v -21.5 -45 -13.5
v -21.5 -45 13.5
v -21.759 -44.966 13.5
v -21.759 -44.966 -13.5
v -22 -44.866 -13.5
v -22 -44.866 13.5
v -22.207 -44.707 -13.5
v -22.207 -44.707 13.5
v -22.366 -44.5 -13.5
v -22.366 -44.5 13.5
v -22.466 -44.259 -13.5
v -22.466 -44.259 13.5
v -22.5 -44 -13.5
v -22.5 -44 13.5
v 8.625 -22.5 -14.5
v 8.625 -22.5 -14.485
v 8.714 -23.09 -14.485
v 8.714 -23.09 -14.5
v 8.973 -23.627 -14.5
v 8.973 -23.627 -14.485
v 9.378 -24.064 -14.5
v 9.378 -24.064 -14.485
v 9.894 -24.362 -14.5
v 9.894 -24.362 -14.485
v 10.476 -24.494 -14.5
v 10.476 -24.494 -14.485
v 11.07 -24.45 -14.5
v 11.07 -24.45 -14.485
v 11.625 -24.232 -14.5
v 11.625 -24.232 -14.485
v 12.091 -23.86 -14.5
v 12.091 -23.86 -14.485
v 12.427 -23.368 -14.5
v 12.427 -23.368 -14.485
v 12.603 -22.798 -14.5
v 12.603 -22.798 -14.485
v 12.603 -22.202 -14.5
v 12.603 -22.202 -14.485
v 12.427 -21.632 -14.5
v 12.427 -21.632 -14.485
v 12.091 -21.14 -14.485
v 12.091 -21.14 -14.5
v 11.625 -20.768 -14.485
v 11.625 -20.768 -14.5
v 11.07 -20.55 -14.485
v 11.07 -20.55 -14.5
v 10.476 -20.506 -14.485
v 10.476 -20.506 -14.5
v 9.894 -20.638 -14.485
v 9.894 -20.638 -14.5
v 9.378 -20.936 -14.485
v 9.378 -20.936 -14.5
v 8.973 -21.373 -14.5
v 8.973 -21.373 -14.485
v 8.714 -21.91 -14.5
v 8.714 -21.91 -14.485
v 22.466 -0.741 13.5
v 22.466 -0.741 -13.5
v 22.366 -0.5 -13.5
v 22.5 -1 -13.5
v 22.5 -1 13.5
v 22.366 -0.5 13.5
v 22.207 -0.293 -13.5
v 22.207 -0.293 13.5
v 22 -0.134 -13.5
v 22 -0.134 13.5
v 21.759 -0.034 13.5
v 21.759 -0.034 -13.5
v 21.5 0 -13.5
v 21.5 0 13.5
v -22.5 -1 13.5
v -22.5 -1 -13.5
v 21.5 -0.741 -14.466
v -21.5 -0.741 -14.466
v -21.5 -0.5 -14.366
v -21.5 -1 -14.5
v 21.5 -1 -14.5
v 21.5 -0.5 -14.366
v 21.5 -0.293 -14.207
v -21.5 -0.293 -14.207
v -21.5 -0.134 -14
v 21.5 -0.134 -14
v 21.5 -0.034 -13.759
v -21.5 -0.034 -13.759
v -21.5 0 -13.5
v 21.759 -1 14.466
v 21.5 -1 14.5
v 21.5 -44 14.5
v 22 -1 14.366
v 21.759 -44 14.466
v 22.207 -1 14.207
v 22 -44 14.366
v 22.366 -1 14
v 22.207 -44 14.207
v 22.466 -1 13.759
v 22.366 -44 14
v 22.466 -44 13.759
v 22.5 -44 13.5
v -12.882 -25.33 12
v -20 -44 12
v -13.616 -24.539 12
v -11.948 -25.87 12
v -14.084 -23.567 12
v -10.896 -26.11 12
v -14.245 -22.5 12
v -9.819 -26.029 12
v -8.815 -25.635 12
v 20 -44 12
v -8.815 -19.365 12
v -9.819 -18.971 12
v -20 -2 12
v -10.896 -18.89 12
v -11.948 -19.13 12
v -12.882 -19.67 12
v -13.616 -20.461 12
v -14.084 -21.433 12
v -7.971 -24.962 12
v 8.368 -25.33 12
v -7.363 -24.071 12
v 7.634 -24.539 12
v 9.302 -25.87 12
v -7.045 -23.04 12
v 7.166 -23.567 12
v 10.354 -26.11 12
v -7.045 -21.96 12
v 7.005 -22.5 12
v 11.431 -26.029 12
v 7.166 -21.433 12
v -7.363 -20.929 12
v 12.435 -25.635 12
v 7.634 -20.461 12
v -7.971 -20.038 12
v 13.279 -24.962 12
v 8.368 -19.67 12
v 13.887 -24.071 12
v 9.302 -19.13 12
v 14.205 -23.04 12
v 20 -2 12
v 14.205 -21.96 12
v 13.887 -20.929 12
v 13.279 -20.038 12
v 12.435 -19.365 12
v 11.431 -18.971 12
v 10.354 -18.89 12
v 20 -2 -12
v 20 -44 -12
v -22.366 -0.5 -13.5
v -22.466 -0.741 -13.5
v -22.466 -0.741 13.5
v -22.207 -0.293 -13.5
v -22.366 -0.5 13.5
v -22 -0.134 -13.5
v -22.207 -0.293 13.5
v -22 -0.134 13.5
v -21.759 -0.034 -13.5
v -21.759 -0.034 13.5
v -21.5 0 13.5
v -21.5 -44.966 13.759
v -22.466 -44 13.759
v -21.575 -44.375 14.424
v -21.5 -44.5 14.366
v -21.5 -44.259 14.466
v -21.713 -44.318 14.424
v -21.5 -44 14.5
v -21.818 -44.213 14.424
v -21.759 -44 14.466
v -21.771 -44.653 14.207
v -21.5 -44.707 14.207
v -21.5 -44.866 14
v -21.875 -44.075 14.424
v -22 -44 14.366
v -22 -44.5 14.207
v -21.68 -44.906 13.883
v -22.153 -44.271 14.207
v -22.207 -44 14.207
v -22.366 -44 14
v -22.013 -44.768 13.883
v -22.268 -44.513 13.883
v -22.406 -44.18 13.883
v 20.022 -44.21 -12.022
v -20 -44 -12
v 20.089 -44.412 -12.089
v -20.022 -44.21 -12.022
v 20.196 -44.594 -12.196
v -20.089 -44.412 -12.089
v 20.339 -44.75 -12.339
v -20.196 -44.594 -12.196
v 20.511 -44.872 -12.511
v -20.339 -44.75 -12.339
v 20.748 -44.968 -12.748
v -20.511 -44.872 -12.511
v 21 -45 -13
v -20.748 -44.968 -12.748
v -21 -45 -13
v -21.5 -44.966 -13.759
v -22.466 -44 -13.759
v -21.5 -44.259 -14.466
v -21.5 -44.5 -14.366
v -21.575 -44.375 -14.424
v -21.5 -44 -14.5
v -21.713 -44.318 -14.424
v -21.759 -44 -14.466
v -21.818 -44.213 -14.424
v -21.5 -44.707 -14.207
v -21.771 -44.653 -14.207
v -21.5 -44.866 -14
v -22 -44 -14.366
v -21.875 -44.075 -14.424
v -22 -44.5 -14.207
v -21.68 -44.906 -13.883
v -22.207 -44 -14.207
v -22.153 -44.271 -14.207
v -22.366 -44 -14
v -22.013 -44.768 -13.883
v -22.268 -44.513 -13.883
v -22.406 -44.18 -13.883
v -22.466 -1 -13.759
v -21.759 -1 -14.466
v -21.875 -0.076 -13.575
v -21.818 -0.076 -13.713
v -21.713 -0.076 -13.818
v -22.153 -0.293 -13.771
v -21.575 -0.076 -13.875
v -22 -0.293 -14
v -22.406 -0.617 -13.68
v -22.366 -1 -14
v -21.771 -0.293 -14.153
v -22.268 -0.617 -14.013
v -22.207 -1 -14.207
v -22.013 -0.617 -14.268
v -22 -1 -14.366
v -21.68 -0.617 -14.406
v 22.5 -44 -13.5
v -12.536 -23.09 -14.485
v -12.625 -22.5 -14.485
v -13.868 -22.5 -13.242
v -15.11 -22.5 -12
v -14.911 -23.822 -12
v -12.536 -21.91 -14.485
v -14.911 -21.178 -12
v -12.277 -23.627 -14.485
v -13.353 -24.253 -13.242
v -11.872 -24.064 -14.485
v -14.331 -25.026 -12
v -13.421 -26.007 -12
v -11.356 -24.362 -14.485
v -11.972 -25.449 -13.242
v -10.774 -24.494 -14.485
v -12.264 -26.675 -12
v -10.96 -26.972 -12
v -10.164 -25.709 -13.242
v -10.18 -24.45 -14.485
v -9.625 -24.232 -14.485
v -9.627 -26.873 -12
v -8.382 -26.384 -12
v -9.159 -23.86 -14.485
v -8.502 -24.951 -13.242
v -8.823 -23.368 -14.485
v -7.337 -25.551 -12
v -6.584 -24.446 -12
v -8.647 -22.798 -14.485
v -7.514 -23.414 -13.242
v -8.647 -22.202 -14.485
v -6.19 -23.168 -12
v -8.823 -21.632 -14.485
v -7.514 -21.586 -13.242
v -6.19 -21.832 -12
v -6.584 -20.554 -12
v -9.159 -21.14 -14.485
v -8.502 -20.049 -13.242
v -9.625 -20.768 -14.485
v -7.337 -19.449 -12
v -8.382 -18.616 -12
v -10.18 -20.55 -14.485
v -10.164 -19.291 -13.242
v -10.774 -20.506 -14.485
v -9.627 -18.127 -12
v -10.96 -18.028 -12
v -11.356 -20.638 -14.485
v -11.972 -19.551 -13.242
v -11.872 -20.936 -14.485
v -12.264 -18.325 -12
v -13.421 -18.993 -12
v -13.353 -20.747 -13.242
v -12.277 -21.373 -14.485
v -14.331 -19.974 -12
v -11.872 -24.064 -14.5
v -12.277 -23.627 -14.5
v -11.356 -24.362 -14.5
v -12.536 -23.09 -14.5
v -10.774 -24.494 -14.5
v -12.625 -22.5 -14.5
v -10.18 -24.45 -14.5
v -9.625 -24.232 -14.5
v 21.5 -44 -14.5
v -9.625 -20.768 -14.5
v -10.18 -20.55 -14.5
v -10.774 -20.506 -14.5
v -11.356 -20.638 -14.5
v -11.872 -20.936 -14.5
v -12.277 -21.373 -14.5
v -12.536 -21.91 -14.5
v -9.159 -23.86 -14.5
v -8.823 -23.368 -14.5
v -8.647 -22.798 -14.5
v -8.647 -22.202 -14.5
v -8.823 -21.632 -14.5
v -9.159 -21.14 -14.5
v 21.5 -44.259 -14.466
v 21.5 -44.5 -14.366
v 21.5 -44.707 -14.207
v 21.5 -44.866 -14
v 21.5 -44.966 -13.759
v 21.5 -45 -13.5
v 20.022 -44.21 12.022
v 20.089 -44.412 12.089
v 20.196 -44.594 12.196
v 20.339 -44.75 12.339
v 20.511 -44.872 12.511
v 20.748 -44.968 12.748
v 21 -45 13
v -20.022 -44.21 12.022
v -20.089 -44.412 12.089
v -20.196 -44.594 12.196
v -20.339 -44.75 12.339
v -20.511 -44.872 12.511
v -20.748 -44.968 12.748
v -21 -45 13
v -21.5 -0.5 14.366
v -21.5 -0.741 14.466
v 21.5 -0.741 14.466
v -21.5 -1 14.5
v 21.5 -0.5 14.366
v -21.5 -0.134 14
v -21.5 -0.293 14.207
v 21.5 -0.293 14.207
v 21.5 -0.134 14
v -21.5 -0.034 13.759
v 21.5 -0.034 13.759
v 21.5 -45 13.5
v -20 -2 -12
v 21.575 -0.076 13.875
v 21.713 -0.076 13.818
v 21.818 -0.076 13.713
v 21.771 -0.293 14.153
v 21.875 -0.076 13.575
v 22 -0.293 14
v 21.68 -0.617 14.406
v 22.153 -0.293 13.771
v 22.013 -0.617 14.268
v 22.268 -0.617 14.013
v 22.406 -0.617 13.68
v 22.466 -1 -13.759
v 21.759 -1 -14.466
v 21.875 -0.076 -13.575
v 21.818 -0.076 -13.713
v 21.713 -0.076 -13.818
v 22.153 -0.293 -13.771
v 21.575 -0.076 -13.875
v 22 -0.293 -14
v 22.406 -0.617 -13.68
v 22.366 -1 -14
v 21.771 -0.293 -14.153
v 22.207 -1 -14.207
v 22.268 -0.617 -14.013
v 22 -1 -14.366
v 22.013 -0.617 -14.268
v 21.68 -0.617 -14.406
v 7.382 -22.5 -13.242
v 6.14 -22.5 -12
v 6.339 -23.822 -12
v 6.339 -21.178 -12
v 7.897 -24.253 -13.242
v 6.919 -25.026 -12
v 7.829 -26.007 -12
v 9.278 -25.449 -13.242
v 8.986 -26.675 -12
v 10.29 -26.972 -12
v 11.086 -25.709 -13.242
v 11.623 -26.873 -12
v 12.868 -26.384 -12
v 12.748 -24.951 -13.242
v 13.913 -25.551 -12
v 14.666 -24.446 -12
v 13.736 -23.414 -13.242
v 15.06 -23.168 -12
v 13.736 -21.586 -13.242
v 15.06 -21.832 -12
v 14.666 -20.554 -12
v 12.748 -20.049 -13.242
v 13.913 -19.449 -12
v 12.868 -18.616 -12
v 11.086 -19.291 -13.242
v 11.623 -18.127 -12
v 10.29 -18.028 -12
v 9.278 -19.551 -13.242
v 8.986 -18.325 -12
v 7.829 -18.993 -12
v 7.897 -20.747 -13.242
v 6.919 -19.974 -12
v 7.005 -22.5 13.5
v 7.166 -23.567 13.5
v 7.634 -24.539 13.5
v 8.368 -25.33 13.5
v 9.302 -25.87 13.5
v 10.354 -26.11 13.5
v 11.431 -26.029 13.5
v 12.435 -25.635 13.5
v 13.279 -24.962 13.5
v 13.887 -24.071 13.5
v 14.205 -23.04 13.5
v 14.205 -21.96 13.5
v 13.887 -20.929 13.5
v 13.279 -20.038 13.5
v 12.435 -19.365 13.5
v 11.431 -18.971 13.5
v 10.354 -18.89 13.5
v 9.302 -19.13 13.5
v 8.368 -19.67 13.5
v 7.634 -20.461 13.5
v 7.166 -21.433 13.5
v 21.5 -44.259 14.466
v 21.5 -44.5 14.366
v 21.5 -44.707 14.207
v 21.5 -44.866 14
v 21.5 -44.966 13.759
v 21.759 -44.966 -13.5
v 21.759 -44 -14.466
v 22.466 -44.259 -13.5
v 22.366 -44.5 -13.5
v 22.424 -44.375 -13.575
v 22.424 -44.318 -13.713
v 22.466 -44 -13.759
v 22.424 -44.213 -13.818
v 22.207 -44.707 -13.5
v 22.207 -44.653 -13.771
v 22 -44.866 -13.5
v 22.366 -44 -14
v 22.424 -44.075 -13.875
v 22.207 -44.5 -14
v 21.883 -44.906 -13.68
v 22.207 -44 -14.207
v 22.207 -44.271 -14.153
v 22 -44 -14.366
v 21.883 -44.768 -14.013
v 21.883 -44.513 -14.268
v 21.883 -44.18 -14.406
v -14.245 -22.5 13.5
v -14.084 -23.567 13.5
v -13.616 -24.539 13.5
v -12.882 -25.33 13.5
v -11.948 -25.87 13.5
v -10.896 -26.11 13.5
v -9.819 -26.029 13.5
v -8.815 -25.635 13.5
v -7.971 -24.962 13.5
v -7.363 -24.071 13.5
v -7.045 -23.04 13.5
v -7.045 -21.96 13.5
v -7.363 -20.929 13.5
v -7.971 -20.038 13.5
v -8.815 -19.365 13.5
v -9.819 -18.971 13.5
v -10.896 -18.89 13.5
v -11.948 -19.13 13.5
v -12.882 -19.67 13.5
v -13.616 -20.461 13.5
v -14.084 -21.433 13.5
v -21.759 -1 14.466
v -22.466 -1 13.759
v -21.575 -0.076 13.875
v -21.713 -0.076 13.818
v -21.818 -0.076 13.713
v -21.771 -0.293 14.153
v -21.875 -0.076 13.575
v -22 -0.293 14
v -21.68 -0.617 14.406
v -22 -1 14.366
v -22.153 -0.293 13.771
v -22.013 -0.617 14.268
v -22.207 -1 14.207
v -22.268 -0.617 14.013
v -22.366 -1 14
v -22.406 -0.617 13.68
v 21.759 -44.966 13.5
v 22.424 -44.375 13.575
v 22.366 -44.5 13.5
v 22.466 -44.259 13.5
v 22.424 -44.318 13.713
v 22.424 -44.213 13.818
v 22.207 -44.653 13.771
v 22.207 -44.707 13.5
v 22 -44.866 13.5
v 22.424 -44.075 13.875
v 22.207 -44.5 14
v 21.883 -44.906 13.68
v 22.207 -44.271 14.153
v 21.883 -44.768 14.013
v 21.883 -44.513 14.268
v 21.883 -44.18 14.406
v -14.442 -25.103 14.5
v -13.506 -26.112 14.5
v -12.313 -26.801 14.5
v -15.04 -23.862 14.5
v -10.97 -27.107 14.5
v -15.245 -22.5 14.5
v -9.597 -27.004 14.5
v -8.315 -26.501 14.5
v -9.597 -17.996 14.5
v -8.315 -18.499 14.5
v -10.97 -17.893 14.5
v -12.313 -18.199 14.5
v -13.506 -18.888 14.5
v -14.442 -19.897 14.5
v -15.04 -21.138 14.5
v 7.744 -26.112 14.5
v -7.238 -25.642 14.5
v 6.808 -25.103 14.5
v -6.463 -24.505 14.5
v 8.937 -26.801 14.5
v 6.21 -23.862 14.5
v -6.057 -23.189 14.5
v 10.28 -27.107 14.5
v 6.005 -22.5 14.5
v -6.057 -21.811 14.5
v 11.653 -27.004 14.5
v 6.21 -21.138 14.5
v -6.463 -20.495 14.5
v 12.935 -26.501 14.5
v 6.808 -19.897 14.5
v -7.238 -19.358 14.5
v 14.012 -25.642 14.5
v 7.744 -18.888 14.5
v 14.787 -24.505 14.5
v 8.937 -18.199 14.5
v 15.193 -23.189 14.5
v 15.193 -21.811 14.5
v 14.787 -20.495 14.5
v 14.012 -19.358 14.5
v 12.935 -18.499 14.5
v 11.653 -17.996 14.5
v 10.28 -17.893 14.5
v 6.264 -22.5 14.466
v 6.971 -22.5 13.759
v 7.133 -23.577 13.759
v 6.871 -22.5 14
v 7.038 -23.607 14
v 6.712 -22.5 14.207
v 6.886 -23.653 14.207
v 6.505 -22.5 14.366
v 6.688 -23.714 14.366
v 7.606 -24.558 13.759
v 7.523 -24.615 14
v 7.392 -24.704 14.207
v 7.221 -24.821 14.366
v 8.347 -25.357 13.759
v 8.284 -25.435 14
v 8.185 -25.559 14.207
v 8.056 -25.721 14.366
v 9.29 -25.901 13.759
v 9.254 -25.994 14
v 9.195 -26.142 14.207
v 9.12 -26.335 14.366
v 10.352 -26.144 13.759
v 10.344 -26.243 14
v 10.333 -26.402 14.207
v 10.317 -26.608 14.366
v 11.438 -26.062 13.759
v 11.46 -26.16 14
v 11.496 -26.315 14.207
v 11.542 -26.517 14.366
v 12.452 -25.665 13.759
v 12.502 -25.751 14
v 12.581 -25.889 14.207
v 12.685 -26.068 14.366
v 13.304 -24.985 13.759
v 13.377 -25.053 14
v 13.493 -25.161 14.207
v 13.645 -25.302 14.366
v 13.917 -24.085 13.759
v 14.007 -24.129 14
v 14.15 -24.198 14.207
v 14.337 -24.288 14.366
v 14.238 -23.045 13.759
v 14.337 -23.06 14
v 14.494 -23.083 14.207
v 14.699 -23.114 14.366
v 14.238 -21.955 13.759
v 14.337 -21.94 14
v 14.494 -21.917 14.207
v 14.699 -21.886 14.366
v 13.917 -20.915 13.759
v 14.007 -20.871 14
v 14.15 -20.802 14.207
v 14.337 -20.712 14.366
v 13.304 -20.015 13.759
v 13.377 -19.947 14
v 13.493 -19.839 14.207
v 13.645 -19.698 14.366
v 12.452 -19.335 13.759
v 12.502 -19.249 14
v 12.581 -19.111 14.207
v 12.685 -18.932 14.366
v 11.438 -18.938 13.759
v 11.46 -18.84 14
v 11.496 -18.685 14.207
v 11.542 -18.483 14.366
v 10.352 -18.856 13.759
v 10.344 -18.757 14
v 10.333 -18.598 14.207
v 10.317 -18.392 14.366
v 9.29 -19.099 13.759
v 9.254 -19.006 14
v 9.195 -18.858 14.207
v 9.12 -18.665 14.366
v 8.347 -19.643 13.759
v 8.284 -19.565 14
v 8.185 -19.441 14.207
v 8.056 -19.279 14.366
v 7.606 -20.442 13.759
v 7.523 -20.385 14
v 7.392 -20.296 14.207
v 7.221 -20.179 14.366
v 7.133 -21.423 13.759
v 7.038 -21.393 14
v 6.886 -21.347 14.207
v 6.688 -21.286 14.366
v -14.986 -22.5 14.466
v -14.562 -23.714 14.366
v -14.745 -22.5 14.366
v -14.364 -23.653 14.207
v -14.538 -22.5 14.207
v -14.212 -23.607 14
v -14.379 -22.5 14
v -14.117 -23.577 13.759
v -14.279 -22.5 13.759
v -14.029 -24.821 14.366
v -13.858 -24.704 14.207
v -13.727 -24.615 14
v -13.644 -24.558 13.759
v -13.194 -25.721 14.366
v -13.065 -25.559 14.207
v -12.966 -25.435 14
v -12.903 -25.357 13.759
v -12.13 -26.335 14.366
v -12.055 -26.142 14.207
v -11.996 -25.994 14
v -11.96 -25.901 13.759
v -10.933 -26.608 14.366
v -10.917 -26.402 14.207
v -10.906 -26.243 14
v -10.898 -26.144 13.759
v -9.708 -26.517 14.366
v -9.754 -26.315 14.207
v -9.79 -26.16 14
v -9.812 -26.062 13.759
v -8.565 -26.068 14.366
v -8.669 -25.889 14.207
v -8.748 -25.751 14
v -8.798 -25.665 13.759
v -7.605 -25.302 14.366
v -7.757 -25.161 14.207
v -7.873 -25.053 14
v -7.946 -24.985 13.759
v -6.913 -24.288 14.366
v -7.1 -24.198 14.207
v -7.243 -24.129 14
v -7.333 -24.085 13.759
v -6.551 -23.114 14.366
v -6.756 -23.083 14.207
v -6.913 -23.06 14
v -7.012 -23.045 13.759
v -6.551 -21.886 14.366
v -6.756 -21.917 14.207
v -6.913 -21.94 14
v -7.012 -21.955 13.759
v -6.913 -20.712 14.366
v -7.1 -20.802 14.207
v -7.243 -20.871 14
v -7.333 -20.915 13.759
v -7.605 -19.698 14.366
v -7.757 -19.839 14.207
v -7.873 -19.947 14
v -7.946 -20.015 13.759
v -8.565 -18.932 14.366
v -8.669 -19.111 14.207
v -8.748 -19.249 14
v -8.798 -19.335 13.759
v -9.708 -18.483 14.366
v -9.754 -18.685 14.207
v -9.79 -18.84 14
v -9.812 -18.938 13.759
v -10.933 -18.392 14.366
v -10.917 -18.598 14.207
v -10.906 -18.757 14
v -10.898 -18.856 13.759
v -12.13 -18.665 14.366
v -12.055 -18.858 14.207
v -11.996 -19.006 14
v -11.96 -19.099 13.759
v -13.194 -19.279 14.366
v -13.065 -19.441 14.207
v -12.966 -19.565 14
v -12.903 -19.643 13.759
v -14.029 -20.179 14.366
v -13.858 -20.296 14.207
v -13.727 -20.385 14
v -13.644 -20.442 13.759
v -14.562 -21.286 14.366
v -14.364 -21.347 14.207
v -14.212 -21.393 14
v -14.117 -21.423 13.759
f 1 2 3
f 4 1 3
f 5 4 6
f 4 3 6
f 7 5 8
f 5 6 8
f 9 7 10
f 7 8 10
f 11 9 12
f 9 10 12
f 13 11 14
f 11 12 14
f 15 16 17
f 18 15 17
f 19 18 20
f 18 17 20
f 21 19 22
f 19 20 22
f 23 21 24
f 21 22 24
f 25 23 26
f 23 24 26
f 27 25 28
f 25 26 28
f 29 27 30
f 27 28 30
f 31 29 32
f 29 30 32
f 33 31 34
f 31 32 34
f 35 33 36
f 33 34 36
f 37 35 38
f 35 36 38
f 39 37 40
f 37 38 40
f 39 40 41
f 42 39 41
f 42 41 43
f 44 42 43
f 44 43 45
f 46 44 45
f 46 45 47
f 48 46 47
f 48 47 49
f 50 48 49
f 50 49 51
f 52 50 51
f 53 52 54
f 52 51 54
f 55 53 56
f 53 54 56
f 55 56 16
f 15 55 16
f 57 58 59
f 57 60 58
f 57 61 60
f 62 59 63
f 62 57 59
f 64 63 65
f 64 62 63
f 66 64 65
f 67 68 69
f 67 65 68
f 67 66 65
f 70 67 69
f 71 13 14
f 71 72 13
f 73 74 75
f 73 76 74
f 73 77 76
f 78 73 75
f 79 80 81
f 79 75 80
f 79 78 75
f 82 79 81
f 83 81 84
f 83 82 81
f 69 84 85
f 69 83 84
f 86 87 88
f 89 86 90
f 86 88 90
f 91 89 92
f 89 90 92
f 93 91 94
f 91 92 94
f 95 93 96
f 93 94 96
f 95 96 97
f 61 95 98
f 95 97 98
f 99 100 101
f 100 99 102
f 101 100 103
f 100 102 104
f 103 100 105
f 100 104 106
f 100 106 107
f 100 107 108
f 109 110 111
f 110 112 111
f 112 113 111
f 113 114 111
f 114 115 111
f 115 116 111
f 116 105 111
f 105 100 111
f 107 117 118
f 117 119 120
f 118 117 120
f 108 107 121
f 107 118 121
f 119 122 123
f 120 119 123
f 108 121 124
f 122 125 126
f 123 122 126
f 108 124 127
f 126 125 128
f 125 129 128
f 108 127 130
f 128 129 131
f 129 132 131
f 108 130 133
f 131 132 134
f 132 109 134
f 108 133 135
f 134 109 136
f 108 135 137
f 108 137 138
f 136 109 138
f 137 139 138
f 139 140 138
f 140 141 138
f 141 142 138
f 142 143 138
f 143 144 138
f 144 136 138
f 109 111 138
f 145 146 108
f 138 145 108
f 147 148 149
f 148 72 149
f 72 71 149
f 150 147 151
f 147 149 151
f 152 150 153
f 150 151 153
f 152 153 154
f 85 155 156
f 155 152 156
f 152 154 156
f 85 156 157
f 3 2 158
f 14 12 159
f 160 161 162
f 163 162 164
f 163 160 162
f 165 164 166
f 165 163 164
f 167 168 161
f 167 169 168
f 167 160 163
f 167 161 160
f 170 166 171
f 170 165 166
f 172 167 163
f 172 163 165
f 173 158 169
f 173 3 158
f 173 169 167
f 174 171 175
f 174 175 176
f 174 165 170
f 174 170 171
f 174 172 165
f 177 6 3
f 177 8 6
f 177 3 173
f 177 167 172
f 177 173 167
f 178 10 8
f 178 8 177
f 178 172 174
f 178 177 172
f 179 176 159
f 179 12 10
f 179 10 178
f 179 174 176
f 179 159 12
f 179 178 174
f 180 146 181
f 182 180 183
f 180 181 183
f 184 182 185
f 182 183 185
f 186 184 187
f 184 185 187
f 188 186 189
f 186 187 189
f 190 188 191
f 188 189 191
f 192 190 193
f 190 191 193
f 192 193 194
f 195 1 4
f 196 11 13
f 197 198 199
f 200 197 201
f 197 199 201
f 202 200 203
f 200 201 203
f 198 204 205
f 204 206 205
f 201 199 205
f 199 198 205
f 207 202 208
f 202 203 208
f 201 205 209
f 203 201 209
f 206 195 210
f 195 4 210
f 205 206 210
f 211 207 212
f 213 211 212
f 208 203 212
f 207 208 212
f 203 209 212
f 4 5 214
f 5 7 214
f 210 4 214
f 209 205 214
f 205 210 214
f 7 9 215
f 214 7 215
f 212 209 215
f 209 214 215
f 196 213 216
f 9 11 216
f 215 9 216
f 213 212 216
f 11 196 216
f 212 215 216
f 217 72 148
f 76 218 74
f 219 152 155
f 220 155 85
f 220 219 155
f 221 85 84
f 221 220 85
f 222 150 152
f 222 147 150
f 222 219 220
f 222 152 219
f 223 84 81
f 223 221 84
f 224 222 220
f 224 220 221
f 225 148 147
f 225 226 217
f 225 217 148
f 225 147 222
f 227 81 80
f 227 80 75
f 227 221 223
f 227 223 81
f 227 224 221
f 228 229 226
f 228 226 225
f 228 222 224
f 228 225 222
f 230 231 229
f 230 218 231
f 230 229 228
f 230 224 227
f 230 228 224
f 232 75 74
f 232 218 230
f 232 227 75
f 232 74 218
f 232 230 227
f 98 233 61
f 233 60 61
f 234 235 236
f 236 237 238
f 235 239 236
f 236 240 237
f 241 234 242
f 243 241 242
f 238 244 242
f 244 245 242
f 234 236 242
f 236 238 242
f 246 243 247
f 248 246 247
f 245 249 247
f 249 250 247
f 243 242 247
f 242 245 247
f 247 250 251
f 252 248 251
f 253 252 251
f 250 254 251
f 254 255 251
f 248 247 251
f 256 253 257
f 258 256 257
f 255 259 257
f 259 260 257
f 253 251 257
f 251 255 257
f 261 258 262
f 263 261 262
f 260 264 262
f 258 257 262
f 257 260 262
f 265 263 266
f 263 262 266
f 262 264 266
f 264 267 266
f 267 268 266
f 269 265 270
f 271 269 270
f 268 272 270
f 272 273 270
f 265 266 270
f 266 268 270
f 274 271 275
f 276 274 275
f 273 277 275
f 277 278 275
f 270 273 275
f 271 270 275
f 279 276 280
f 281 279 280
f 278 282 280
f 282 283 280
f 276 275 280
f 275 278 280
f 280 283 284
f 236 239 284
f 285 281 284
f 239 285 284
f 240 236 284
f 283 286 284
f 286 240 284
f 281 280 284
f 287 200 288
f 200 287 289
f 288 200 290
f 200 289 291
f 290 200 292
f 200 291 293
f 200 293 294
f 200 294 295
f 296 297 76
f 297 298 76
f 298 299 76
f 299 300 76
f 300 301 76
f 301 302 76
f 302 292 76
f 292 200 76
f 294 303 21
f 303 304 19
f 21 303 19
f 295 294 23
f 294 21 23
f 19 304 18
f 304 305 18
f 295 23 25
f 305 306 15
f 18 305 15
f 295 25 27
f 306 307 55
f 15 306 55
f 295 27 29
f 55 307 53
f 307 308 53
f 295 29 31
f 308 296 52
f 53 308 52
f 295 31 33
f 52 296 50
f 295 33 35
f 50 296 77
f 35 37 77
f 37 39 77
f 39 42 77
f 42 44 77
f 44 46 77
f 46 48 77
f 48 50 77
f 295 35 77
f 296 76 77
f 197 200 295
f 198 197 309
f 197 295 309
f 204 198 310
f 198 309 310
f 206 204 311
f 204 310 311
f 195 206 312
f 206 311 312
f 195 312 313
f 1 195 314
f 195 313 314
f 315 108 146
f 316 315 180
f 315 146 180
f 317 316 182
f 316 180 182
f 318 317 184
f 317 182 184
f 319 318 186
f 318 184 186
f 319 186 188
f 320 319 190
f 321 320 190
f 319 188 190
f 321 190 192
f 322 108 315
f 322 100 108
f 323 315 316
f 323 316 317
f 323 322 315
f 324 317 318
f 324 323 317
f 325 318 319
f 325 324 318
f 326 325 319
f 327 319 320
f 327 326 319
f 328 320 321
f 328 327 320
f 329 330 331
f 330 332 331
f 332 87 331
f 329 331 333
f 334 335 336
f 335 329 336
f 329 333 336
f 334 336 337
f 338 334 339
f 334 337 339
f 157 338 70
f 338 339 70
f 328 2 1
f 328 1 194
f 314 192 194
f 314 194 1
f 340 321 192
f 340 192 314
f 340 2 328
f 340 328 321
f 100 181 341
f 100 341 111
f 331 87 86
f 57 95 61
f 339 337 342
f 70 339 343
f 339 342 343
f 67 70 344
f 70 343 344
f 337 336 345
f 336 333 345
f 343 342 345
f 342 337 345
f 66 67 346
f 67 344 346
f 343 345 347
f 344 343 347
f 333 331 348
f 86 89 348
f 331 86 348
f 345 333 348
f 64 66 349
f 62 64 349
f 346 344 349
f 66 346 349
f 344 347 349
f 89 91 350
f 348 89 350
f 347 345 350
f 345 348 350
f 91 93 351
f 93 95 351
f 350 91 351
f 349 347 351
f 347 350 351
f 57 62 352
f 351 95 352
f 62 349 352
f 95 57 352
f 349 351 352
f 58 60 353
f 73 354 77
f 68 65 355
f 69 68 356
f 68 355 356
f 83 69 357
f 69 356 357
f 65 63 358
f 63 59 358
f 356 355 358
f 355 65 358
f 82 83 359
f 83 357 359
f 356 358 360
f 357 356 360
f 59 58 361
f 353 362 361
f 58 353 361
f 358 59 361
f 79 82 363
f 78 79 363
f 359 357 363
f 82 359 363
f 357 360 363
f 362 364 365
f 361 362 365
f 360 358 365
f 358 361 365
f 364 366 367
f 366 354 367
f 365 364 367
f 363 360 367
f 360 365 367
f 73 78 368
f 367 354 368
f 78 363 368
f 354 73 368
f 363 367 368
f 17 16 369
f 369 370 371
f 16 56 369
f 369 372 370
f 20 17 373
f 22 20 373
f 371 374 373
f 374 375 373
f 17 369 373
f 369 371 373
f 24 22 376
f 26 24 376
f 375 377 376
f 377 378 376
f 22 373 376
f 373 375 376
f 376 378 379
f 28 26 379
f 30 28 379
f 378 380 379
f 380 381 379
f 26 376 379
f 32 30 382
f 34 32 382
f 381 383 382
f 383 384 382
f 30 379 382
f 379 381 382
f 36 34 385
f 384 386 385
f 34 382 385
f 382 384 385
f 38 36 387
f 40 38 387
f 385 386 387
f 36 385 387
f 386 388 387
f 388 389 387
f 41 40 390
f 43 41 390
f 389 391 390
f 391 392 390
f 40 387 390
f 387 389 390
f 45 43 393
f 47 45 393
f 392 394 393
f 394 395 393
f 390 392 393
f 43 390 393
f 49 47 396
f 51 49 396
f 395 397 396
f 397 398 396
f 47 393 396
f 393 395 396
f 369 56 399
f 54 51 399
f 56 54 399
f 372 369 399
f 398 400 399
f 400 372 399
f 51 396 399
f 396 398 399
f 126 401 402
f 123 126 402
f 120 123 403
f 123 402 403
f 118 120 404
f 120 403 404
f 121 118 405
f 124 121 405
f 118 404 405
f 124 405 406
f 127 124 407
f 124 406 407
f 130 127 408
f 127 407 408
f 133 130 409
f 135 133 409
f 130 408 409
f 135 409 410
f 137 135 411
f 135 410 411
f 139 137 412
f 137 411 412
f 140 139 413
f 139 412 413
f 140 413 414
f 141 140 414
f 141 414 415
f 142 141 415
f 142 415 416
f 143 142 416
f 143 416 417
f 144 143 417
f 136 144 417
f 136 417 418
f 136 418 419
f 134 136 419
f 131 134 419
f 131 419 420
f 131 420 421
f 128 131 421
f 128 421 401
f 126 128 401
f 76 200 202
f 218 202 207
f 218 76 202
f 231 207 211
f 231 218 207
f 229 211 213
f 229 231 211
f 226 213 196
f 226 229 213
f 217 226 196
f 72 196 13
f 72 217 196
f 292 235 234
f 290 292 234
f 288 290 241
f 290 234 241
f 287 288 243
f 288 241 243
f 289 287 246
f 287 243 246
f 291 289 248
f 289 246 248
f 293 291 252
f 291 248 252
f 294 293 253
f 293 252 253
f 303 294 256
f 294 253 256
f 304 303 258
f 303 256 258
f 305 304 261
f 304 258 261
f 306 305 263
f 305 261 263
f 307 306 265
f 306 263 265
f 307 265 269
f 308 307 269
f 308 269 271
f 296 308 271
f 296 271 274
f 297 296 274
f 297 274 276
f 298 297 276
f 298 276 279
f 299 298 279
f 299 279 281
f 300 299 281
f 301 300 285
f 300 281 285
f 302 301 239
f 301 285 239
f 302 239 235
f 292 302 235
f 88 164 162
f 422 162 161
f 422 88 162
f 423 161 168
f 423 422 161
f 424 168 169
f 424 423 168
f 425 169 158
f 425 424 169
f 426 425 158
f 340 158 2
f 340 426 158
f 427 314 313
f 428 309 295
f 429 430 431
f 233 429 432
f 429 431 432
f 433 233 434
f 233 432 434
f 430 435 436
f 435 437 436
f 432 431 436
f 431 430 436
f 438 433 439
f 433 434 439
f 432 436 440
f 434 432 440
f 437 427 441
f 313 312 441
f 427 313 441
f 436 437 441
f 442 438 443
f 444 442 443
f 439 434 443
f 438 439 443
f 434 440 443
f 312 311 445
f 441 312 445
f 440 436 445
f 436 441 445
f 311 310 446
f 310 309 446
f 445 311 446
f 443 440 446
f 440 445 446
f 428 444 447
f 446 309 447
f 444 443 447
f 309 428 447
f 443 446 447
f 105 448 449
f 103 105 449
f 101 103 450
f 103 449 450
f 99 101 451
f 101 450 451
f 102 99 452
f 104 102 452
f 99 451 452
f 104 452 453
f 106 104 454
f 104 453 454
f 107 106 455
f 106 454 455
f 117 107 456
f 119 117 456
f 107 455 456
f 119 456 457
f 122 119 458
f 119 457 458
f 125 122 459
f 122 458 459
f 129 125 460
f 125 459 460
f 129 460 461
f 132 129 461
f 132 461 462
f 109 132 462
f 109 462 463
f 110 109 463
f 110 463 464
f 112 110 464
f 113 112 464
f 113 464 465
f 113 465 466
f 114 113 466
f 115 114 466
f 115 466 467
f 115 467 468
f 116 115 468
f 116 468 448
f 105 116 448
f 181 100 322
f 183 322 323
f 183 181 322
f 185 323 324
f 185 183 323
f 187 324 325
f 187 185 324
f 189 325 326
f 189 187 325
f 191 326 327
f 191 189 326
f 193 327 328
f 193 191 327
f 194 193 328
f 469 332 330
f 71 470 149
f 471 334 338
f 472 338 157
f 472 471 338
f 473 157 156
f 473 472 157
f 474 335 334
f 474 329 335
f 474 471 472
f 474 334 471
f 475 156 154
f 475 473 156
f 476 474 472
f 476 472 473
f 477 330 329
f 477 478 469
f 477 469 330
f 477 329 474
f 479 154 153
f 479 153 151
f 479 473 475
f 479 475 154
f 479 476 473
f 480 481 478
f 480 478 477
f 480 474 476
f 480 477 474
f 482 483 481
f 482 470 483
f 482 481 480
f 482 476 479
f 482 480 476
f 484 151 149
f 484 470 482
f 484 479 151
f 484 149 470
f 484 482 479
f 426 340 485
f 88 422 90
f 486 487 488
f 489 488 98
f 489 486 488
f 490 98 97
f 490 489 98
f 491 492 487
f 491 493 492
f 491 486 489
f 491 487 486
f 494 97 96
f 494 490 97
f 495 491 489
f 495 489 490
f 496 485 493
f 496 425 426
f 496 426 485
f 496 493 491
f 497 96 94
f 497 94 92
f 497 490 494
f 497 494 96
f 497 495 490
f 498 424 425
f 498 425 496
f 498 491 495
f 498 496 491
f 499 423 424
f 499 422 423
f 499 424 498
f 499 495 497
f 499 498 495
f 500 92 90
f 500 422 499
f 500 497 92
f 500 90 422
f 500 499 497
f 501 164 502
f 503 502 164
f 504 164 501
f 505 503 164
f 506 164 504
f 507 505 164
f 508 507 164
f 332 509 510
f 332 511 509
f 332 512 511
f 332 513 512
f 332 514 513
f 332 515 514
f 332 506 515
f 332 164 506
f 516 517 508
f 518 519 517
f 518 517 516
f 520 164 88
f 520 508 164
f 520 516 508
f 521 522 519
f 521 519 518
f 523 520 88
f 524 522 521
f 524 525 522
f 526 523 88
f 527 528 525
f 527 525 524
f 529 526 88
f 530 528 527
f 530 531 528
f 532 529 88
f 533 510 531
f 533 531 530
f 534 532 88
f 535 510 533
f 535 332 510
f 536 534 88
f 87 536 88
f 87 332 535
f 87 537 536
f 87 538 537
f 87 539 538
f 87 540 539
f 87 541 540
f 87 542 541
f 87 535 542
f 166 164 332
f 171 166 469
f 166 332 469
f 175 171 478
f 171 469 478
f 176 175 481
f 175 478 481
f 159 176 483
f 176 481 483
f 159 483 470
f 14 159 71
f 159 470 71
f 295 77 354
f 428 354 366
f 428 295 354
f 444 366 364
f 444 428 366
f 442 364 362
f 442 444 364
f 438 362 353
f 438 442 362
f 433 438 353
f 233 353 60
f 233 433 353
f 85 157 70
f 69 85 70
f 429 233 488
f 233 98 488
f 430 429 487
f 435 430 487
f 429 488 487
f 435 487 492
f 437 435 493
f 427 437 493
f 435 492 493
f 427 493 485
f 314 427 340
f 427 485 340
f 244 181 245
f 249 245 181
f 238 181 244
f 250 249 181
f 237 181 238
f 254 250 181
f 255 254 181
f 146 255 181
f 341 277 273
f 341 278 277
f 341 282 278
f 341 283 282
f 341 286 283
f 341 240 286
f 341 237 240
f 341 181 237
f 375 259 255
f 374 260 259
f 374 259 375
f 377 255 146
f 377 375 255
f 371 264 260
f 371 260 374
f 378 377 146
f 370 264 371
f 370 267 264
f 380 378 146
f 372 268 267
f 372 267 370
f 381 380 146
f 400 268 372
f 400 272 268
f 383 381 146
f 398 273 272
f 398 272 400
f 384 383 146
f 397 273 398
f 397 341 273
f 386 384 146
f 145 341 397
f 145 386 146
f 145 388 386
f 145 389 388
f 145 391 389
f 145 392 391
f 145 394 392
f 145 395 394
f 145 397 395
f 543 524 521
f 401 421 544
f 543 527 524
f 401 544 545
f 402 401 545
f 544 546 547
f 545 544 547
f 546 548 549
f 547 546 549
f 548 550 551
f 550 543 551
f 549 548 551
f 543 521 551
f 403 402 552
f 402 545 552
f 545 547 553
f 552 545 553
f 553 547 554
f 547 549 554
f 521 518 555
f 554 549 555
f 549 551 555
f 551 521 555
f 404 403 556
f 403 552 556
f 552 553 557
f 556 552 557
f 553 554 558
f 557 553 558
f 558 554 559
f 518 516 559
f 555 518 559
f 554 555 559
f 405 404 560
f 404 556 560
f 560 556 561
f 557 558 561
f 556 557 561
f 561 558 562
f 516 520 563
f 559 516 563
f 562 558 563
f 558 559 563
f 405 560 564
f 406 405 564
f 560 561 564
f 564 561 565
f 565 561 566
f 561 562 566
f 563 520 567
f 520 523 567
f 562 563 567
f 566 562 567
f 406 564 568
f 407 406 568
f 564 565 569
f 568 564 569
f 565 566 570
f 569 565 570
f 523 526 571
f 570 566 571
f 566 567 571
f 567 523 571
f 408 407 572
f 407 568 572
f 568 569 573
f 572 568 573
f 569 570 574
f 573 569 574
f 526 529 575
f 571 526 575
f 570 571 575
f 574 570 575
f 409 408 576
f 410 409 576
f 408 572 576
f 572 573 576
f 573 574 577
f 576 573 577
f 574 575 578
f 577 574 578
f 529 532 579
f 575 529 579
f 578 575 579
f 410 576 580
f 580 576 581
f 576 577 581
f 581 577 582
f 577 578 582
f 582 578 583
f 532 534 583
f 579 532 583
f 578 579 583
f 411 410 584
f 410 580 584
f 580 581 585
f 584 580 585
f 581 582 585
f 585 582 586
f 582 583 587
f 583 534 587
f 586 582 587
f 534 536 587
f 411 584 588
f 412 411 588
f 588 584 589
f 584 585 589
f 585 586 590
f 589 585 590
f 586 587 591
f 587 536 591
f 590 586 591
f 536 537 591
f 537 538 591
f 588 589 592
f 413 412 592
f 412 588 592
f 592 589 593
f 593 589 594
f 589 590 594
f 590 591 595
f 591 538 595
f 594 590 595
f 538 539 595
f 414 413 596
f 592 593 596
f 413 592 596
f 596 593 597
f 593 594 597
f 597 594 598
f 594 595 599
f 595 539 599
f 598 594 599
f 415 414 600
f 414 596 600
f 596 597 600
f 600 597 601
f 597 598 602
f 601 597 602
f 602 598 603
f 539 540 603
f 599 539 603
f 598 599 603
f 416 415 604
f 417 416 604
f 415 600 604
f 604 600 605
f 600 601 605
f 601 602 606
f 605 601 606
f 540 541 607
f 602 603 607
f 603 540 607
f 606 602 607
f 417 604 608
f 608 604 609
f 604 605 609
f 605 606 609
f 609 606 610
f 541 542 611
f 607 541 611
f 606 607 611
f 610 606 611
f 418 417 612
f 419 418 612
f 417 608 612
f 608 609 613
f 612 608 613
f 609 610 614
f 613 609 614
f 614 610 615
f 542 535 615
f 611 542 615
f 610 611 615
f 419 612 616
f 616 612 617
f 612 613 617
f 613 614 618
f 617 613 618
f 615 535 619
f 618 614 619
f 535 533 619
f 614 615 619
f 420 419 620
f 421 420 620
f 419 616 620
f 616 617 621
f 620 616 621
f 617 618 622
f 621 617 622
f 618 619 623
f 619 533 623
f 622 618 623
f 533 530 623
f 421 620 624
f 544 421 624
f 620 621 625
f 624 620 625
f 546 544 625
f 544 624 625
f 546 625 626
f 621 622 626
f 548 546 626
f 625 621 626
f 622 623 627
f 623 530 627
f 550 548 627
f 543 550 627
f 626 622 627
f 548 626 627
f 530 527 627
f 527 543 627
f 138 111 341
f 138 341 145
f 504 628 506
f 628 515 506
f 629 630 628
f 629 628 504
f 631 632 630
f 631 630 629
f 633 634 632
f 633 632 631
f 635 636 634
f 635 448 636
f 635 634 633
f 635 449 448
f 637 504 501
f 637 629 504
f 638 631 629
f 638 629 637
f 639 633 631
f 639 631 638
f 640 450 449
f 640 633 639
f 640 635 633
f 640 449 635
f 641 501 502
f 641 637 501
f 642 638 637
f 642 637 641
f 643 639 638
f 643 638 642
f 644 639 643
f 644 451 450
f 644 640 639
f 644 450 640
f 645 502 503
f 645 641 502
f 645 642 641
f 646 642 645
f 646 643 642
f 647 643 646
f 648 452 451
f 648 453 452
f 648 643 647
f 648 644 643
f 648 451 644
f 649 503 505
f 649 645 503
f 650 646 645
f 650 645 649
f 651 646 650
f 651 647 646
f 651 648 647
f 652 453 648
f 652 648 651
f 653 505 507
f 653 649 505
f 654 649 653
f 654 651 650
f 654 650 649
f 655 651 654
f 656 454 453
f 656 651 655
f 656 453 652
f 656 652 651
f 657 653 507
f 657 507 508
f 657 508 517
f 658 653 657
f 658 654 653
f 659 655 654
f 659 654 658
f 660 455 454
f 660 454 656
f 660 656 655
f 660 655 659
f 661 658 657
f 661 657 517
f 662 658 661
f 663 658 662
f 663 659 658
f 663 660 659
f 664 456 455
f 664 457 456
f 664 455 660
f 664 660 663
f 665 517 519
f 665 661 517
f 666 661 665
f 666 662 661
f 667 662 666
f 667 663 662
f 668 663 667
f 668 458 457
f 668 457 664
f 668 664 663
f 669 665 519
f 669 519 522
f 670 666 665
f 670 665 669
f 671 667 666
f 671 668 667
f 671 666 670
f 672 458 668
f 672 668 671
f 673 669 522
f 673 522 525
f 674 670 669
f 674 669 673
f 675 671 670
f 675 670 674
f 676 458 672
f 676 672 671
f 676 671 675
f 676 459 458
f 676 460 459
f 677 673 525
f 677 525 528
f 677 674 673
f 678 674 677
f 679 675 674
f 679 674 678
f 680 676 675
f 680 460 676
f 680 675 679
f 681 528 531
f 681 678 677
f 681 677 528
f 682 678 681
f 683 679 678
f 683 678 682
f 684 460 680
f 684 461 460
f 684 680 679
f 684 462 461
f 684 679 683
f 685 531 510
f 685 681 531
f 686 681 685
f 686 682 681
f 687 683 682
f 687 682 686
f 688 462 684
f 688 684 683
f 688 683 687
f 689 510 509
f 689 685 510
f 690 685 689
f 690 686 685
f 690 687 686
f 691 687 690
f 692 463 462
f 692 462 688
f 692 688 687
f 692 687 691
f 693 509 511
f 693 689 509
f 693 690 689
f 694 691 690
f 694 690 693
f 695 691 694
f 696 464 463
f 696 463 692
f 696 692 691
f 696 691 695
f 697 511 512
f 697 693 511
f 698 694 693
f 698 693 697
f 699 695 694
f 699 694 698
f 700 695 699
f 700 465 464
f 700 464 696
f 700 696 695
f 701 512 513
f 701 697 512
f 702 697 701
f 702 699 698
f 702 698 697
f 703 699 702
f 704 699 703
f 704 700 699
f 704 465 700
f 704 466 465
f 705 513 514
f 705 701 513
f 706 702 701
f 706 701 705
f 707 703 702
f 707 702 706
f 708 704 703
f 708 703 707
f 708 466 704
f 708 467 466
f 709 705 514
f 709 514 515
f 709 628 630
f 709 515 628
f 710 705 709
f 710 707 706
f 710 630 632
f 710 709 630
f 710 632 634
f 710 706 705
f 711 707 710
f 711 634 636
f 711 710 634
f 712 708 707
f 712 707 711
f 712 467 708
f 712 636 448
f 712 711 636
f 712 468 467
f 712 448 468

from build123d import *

# Parameters (mm, degrees)
SKETCH_W          = 45
SKETCH_H          = 29
PAD_DEPTH         = 45
SKETCH001_W       = 40
SKETCH001_H       = 24
POCKET_DEPTH      = 0.001
POCKET_DEPTH_BACK = 45.001
SKETCH002_R       = 3.62
POCKET001_DEPTH   = 3.5
SKETCH003_R       = 2
POCKET002_DEPTH   = 2.5
CHAMFER_SIZE      = 2.485
SKETCH004_W       = 45
SKETCH004_H       = 29
PAD001_DEPTH      = 2
FILLET_R          = 1


with BuildPart() as part:
    # Sketch → Pad (new body)
    with BuildSketch(Plane.XZ):
        Rectangle(SKETCH_W, SKETCH_H)
    extrude(amount=PAD_DEPTH)

    # Sketch001 → Pocket (cut, two sides)
    with BuildSketch(Plane.XZ) as pocket_sk:
        Rectangle(SKETCH001_W, SKETCH001_H)
    extrude(amount=-POCKET_DEPTH, mode=Mode.SUBTRACT)
    extrude(pocket_sk.sketch, amount=POCKET_DEPTH_BACK, mode=Mode.SUBTRACT)

    # Sketch002 (on DatumPlane) → Pocket001 (cut)
    with BuildSketch(Plane(origin=(0, 0, 14.5), x_dir=(-1, 0, 0), z_dir=(0, 0, 1))):
        with Locations((-10.625, 22.5)):
            Circle(SKETCH002_R)
        with Locations((10.625, 22.5)):
            Circle(SKETCH002_R)
    extrude(amount=-POCKET001_DEPTH, mode=Mode.SUBTRACT)

    # Sketch003 (on DatumPlane) → Pocket002 (cut)
    with BuildSketch(Plane(origin=(0, 0, -12), x_dir=(-1, 0, 0), z_dir=(0, 0, 1))):
        with Locations((-10.625, 22.5)):
            Circle(SKETCH003_R)
        with Locations((10.625, 22.5)):
            Circle(SKETCH003_R)
    extrude(amount=-POCKET002_DEPTH, mode=Mode.SUBTRACT)

    # Chamfer
    chamfer_edges = [part.edges().sort_by_distance(p)[0] for p in [
        (-8.625, -22.5, -12),
        (12.625, -22.5, -12),
    ]]
    chamfer(chamfer_edges, length=CHAMFER_SIZE)

    # Sketch004 → Pad001 (join)
    with BuildSketch(Plane.XZ):
        Rectangle(SKETCH004_W, SKETCH004_H)
    extrude(amount=PAD001_DEPTH)

    # Fillet
    fillet_edges = [part.edges().sort_by_distance(p)[0] for p in [
        (-22.5, -45, 0),
        (0, -45, 14.5),
        (0, -45, -14.5),
        (22.5, -45, 0),
        (-20, -45, 0),
        (0, -45, 12),
        (20, -45, 0),
        (0, -45, -12),
        (22.5, -23.5, 14.5),
        (22.5, -23.5, -14.5),
        (-22.5, -23.5, 14.5),
        (-22.5, -23.5, -14.5),
        (0, 0, 14.5),
        (-22.5, 0, 0),
        (22.5, 0, 0),
        (22.5, -1, 14.5),
        (-22.5, -1, 14.5),
        (-22.5, -1, -14.5),
        (22.5, -1, -14.5),
        (0, 0, -14.5),
        (-7.005, -22.5, 14.5),
        (14.245, -22.5, 14.5),
    ]]
    fillet(fillet_edges, radius=FILLET_R)


solid = part.part
